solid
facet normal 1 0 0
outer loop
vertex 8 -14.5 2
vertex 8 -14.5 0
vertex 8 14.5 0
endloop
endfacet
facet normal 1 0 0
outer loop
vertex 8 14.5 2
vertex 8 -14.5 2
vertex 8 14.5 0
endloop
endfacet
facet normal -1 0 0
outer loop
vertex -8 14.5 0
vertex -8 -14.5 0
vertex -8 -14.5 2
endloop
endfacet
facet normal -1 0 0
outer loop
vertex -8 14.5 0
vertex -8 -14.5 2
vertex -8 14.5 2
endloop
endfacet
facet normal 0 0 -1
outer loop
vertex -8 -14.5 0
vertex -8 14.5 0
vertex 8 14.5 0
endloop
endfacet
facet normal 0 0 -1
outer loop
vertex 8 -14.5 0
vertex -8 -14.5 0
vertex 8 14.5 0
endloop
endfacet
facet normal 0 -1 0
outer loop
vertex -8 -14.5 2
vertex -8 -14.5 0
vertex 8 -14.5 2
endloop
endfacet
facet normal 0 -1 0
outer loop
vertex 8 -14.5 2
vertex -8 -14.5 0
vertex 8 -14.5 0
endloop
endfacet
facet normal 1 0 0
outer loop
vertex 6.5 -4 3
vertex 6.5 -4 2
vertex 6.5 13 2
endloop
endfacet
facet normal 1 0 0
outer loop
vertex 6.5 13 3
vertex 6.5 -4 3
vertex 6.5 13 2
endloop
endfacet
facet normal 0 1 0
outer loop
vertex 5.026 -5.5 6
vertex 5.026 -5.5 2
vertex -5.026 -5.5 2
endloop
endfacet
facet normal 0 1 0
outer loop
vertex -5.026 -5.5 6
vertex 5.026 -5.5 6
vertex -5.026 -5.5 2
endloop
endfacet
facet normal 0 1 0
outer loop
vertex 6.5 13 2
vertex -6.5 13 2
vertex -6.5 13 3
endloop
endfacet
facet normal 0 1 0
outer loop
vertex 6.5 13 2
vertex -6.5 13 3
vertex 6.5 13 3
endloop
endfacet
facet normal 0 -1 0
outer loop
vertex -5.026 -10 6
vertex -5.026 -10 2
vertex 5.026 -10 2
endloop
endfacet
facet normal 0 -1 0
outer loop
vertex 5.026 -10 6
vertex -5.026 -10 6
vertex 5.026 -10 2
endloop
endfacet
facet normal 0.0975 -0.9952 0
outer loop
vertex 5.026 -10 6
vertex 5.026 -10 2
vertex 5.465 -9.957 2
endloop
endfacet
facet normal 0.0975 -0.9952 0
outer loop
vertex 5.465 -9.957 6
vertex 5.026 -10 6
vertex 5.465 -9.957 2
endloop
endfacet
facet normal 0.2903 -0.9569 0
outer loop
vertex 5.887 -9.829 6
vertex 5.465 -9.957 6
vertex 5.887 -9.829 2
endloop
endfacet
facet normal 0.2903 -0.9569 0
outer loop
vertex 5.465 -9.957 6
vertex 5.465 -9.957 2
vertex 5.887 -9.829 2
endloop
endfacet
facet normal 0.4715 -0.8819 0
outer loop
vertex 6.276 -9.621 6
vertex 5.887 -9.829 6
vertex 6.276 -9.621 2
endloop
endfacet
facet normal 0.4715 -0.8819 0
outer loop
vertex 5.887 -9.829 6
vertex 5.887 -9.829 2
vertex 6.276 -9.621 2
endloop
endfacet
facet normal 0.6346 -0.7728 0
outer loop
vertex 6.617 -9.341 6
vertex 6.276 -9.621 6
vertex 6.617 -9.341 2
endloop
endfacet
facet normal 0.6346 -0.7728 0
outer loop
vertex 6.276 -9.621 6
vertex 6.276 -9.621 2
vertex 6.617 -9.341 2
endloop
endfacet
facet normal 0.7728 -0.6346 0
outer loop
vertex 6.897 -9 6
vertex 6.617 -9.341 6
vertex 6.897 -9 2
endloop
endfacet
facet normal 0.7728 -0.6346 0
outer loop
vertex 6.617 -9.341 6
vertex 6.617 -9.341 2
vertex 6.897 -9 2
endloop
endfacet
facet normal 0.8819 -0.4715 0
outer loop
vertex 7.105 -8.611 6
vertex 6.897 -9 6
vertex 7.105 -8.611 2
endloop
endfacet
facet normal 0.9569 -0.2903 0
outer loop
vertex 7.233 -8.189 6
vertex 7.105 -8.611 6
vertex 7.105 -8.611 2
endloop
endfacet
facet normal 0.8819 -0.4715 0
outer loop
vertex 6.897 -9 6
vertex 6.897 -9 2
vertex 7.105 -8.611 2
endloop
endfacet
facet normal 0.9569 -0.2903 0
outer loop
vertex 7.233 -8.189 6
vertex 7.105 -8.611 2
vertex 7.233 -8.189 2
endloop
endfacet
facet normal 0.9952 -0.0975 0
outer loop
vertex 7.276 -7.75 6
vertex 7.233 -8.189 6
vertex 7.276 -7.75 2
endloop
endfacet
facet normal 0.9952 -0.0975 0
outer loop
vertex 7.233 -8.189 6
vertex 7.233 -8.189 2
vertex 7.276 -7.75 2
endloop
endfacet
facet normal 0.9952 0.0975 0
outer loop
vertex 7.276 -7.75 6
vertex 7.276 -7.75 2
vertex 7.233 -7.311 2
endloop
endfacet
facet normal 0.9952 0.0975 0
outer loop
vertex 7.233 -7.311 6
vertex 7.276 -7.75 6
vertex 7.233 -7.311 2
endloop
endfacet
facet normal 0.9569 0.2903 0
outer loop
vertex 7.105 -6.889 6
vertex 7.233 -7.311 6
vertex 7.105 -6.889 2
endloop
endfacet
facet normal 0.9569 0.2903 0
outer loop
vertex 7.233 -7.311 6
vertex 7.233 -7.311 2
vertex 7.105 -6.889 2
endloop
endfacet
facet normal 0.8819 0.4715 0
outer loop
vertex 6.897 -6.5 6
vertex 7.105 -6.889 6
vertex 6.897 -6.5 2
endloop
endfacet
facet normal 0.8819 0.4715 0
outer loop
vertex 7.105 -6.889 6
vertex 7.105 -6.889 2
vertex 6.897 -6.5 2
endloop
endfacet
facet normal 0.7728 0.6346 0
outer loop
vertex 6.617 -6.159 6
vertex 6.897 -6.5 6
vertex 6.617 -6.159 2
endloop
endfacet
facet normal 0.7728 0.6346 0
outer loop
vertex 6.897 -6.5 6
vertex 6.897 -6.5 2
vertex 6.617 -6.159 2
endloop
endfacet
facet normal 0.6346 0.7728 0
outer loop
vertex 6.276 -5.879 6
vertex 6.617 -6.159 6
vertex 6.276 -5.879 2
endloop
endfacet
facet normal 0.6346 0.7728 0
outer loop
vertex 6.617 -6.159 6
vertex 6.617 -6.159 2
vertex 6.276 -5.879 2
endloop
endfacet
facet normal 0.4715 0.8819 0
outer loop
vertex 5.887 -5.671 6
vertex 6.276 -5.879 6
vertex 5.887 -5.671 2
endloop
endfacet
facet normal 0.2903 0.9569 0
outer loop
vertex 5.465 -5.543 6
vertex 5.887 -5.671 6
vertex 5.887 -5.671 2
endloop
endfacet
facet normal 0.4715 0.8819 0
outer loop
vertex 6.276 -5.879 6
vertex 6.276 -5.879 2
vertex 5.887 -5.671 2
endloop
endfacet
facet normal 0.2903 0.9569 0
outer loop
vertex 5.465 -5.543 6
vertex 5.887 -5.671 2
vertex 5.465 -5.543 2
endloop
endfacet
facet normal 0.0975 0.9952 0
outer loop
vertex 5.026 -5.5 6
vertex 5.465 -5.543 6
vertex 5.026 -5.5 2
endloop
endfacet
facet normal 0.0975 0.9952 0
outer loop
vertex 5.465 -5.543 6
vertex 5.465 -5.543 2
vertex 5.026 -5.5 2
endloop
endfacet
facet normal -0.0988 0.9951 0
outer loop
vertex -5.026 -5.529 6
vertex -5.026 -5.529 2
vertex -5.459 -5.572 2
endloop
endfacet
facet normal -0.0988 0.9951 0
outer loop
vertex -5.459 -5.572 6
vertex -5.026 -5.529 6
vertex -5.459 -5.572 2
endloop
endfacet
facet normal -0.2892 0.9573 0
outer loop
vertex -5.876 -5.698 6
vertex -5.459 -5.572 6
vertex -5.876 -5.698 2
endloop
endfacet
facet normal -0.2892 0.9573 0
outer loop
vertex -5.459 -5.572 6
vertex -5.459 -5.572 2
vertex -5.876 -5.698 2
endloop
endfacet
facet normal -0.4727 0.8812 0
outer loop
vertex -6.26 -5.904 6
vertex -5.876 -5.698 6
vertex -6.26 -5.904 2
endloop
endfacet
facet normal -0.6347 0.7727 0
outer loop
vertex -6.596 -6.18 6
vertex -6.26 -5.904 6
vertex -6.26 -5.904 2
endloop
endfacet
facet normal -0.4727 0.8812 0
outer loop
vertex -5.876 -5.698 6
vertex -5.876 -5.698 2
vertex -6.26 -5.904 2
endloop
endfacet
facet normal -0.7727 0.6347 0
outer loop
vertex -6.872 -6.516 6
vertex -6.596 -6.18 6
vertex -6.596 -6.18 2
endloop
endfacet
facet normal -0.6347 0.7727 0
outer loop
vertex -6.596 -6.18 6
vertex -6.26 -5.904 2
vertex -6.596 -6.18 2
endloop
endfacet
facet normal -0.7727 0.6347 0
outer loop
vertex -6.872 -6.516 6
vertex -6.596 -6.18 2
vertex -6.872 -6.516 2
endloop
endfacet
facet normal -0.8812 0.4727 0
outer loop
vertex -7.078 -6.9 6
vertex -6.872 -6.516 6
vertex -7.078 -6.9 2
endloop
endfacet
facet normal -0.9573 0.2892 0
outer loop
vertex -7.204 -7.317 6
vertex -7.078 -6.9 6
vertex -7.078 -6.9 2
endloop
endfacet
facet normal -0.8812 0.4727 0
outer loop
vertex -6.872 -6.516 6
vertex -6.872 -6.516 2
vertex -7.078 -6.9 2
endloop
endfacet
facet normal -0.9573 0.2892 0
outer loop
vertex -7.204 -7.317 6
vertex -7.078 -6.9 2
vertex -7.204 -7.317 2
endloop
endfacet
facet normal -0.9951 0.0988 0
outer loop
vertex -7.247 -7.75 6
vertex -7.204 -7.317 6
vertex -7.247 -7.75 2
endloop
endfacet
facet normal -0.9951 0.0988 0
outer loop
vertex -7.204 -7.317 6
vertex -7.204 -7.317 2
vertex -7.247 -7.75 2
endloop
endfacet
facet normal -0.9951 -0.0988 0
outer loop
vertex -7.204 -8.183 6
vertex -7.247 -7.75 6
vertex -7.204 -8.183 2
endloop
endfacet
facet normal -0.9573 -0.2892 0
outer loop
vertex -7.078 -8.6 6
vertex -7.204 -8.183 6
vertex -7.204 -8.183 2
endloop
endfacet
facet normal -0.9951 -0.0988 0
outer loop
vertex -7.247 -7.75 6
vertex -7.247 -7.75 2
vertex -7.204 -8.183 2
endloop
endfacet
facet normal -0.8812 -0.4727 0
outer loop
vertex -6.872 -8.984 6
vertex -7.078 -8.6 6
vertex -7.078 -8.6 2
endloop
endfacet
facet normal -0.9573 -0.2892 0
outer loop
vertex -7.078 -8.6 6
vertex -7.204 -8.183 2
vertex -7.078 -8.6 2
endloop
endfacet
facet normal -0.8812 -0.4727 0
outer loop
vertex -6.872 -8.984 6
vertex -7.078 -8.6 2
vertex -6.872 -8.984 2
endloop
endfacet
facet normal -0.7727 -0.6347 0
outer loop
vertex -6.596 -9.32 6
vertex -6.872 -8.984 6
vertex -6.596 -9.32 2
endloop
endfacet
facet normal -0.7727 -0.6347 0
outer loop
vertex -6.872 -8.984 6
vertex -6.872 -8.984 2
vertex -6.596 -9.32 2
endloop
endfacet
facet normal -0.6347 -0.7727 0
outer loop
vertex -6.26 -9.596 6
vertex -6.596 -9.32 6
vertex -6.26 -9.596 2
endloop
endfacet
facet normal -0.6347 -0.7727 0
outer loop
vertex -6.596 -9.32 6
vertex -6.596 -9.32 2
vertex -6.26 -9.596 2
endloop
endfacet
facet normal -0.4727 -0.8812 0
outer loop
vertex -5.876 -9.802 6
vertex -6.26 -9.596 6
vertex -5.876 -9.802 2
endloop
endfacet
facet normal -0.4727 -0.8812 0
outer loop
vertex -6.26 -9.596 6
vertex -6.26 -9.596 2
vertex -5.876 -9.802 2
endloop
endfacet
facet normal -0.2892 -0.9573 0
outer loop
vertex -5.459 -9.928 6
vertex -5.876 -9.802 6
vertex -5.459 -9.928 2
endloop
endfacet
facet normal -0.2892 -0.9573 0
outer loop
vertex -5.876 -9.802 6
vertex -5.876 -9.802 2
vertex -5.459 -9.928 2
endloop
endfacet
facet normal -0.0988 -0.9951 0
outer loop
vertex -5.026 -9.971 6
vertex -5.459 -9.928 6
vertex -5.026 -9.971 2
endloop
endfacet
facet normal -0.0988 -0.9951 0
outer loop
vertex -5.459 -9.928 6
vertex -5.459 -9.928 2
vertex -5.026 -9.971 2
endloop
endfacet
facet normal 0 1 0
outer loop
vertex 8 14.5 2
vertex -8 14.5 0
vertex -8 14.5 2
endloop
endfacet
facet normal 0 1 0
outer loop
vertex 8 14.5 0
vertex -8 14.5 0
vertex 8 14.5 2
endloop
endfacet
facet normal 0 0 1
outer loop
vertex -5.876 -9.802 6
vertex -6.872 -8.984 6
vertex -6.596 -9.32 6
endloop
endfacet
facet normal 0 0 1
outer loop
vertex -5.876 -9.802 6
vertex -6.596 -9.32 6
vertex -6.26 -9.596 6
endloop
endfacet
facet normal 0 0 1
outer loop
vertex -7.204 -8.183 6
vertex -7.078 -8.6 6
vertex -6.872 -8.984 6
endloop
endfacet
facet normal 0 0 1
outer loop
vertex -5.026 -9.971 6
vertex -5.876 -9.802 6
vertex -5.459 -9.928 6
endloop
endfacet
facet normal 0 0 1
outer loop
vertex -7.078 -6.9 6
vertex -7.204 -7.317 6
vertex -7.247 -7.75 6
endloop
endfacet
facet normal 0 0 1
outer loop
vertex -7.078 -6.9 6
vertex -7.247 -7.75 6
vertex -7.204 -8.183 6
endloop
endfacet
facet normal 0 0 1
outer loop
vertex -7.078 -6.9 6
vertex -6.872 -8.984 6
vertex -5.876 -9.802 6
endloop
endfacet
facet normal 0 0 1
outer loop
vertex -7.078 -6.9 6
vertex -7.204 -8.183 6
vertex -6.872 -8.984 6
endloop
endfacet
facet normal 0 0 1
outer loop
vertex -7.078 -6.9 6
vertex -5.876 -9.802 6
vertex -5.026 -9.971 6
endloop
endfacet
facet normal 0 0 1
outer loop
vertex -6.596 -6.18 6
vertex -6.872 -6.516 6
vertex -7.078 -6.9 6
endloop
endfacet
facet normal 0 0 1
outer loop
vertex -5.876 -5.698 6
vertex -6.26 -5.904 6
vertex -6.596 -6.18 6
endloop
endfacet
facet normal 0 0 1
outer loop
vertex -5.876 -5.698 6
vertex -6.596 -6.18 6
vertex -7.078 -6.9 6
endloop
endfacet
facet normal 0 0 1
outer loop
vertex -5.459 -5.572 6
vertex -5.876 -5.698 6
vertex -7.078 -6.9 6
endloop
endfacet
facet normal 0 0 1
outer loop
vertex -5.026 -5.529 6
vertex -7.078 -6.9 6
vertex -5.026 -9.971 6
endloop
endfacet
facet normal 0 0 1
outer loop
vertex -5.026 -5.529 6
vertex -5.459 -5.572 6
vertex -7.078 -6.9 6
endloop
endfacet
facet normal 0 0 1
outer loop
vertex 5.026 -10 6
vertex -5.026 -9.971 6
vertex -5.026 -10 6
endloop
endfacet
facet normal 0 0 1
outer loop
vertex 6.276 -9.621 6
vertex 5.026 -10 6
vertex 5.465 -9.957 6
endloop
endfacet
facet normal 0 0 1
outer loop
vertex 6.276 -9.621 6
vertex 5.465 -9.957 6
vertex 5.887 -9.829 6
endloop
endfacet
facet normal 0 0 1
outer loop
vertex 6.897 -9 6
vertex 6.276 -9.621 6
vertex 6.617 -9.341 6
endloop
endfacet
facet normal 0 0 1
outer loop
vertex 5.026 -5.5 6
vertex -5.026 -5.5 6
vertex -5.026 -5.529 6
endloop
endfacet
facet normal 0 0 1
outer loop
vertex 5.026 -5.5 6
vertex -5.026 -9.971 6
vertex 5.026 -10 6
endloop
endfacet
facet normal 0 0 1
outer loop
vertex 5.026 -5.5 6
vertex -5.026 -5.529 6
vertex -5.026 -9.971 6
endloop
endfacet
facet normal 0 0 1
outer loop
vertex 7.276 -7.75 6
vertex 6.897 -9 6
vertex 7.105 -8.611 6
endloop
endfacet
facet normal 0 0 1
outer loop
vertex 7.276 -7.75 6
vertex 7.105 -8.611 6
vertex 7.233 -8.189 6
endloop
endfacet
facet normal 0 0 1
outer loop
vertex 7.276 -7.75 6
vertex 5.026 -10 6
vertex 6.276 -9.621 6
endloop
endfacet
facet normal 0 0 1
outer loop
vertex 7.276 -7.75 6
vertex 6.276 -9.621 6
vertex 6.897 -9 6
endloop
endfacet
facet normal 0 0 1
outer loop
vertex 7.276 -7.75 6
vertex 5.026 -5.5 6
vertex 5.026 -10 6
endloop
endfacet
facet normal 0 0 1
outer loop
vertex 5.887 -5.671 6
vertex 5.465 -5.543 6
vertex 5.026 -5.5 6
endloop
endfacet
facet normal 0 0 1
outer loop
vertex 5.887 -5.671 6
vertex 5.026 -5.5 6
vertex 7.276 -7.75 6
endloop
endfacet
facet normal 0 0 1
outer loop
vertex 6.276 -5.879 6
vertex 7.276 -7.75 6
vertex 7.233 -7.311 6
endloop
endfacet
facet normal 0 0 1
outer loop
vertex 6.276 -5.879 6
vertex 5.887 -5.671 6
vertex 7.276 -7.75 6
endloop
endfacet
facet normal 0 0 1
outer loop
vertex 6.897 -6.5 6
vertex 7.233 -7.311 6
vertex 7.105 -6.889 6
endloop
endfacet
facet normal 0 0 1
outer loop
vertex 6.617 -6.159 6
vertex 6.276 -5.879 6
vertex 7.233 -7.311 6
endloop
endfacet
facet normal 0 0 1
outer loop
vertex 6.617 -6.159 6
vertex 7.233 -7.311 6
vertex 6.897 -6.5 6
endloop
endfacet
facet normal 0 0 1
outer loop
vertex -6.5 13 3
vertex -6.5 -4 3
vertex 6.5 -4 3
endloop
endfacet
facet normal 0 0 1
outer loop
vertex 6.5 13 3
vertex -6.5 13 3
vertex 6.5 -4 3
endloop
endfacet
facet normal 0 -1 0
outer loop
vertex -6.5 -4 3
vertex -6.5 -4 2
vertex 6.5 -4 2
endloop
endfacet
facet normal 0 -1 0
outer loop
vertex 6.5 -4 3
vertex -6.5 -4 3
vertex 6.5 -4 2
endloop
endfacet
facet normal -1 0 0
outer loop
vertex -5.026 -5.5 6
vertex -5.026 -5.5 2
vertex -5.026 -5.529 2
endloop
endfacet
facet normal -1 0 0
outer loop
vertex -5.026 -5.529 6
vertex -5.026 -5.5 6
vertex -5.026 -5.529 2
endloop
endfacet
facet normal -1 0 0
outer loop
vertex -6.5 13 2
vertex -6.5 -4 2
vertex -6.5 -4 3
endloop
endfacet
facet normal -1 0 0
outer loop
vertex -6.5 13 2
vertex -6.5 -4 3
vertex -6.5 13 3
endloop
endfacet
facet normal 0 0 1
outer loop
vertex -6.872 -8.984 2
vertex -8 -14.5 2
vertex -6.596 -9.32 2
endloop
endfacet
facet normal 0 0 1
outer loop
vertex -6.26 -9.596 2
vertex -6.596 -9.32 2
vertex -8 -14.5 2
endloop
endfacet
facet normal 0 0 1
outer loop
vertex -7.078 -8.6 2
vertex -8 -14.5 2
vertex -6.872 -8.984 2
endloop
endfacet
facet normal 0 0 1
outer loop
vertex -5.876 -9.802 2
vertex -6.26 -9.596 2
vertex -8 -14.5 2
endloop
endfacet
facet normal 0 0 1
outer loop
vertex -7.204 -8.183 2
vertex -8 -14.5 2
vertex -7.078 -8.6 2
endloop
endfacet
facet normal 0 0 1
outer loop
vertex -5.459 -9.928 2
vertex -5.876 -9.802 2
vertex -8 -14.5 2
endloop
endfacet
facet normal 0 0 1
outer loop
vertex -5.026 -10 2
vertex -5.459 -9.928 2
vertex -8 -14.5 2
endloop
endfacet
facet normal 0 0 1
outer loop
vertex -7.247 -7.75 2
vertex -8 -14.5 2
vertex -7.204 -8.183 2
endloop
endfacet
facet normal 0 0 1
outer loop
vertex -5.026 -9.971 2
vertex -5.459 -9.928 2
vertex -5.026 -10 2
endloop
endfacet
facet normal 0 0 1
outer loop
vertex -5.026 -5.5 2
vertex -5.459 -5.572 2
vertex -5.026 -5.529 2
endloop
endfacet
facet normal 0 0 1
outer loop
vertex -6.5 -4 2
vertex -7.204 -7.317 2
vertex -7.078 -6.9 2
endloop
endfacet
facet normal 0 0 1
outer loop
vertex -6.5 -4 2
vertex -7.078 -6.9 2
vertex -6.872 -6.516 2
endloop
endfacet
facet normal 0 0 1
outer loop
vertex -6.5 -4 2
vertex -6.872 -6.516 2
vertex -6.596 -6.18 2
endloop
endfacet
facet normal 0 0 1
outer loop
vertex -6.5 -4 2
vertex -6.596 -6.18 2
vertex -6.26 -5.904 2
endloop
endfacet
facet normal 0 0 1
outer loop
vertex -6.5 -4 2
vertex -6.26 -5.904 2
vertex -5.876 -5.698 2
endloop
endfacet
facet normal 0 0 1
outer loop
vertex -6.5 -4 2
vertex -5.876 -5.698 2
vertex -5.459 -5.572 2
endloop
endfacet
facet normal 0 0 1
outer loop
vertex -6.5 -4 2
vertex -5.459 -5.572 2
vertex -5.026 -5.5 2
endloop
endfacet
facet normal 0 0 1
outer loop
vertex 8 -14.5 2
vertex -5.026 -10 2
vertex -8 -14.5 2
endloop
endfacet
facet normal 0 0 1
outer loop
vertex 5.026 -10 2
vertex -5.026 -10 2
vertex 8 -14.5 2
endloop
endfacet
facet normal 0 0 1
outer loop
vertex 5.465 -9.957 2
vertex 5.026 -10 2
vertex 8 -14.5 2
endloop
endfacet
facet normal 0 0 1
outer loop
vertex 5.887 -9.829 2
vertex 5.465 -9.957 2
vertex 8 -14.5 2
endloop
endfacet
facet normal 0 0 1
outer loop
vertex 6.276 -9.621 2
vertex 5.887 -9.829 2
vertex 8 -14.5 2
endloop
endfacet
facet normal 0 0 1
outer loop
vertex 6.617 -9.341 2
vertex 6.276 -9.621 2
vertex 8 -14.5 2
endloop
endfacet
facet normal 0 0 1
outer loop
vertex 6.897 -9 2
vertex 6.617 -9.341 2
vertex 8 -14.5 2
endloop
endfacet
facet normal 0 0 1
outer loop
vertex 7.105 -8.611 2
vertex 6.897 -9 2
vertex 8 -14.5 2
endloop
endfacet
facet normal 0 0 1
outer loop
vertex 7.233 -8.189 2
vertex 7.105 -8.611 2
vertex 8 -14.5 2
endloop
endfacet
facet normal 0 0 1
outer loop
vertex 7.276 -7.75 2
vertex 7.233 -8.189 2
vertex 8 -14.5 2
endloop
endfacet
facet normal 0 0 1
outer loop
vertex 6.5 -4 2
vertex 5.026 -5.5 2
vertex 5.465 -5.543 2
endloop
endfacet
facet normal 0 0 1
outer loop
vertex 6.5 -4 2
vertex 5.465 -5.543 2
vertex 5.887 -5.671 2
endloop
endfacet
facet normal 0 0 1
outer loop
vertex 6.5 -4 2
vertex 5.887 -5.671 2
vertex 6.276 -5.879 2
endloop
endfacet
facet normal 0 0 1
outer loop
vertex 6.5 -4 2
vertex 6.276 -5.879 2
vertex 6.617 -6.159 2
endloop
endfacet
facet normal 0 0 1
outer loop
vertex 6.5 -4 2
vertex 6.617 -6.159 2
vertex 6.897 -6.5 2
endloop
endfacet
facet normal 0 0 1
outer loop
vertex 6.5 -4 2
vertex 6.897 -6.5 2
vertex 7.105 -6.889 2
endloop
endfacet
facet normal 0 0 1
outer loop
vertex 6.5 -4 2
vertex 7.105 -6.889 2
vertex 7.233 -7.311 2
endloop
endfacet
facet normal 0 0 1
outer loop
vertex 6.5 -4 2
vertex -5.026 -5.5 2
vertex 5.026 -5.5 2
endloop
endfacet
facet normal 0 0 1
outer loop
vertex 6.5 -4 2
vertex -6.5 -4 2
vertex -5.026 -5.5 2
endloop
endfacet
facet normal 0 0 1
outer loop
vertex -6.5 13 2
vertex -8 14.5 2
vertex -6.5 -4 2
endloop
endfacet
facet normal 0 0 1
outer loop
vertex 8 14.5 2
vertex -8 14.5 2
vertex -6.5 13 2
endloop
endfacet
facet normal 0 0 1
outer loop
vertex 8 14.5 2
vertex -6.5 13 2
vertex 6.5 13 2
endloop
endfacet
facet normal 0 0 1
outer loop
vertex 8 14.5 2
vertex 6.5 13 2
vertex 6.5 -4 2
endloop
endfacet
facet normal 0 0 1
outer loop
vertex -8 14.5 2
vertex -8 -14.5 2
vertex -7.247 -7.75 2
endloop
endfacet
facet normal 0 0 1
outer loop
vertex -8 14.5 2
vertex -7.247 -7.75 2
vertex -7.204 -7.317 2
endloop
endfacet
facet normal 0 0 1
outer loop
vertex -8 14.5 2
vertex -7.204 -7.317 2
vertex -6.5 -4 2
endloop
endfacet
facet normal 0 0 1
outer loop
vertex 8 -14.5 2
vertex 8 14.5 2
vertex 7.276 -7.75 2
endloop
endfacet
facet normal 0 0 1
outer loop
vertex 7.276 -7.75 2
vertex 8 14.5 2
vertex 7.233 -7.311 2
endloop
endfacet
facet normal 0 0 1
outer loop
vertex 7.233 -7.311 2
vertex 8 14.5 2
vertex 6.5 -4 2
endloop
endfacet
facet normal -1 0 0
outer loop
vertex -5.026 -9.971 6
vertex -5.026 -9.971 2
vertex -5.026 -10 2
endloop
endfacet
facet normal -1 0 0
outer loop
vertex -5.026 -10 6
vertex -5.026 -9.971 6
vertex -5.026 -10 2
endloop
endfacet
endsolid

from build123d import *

# Parameters (mm, degrees)
F0_W     = 16
F0_H     = 29
F0_W_2   = 13
F0_H_2   = 17
F1_DEPTH = 2
F2_DEPTH = 6
F3_DEPTH = 3


with BuildPart() as f1:
    # F0 (on Top) → F1 (new body)
    with BuildSketch(Plane.XY):
        Rectangle(F0_W, F0_H)
        with BuildLine():
            ThreePointArc((7.2759241834, -7.75), (6.6169144411, -9.3409902577), (5.0259241834, -10))
            Line((5.0259241834, -10), (-5.0259241834, -10))
            Line((-5.0259241834, -10), (-5.0259241834, -9.9706540408))
            ThreePointArc((-5.0259241834, -9.9706540408), (-7.2465782242, -7.75), (-5.0259241834, -5.5293459592))
            Line((-5.0259241834, -5.5293459592), (-5.0259241834, -5.5))
            Line((-5.0259241834, -5.5), (5.0259241834, -5.5))
            ThreePointArc((5.0259241834, -5.5), (6.6169144411, -6.1590097423), (7.2759241834, -7.75))
        make_face(mode=Mode.SUBTRACT)
        with Locations((0, 4.5)):
            Rectangle(F0_W_2, F0_H_2, mode=Mode.SUBTRACT)
    extrude(amount=F1_DEPTH)

    # F0 (on Top) → F2 (join)
    with BuildSketch(Plane.XY):
        with BuildLine():
            Line((-5.0259241834, -5.5293459592), (-5.0259241834, -9.9706540408))
            ThreePointArc((-5.0259241834, -9.9706540408), (-3.4556846525, -9.3202395309), (-2.8052701426, -7.75))
            ThreePointArc((-2.8052701426, -7.75), (-3.4556846525, -6.1797604691), (-5.0259241834, -5.5293459592))
        make_face()
        with BuildLine():
            ThreePointArc((-5.0259241834, -5.5293459592), (-7.2465782242, -7.75), (-5.0259241834, -9.9706540408))
            Line((-5.0259241834, -9.9706540408), (-5.0259241834, -5.5293459592))
        make_face()
        with BuildLine():
            ThreePointArc((5.0259241834, -5.5), (2.7759241834, -7.75), (5.0259241834, -10))
            Line((5.0259241834, -10), (5.0259241834, -5.5))
        make_face()
        with BuildLine():
            Line((5.0259241834, -5.5), (5.0259241834, -10))
            ThreePointArc((5.0259241834, -10), (6.6169144411, -9.3409902577), (7.2759241834, -7.75))
            ThreePointArc((7.2759241834, -7.75), (6.6169144411, -6.1590097423), (5.0259241834, -5.5))
        make_face()
        with BuildLine():
            Line((-5.0259241834, -10), (5.0259241834, -10))
            ThreePointArc((5.0259241834, -10), (2.7759241834, -7.75), (5.0259241834, -5.5))
            Line((5.0259241834, -5.5), (-5.0259241834, -5.5))
            Line((-5.0259241834, -5.5), (-5.0259241834, -5.5293459592))
            ThreePointArc((-5.0259241834, -5.5293459592), (-3.4556846525, -6.1797604691), (-2.8052701426, -7.75))
            ThreePointArc((-2.8052701426, -7.75), (-3.4556846525, -9.3202395309), (-5.0259241834, -9.9706540408))
            Line((-5.0259241834, -9.9706540408), (-5.0259241834, -10))
        make_face()
    extrude(amount=F2_DEPTH)

    # F0 (on Top) → F3 (join)
    with BuildSketch(Plane.XY):
        with Locations((0, 4.5)):
            Rectangle(F0_W_2, F0_H_2)
    extrude(amount=F3_DEPTH)


solid = f1.part
